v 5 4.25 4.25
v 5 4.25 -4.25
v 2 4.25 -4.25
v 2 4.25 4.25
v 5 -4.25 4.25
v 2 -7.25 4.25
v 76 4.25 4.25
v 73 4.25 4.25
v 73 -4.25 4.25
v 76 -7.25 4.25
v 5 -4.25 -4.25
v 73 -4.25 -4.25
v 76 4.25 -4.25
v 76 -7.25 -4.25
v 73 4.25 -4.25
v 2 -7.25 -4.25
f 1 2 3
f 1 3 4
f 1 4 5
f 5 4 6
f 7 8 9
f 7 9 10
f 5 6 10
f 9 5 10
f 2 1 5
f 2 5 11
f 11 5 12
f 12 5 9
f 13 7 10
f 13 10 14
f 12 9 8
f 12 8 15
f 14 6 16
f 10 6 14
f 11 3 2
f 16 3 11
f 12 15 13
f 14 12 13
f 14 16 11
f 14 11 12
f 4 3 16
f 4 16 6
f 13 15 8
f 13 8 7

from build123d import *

# Parameters (mm, degrees)
SKETCH1_W            = 8.5
SKETCH1_H            = 8.5
BOSS_EXTRUDE1_DEPTH  = 5
SKETCH2_W            = 8.5
SKETCH2_H            = 8.5
BOSS_EXTRUDE2_DEPTH  = 2
SKETCH3_R            = 1.5
CUT_EXTRUDE1_DEPTH   = 2
SKETCH4_W            = 82
SKETCH4_H            = 8.5
BOSS_EXTRUDE3_DEPTH  = 3
SKETCH5_W            = 7
SKETCH5_H            = 8.5
BOSS_EXTRUDE4_DEPTH  = 8.5
CUT_EXTRUDE2_DEPTH   = 5
SKETCH7_R            = 1.5
CUT_EXTRUDE3_DEPTH   = 5
CUT_EXTRUDE4_DEPTH   = 10
SKETCH9_W            = 8.5
SKETCH9_H            = 8.5
SKETCH9_R            = 1.5
BOSS_EXTRUDE5_DEPTH  = 2
CUT_EXTRUDE5_DEPTH   = 2
SKETCH11_W           = 8.5
SKETCH11_H           = 8.5
SKETCH11_R           = 1.5
BOSS_EXTRUDE6_DEPTH  = 2
BOSS_EXTRUDE7_DEPTH  = 5
BOSS_EXTRUDE8_DEPTH  = 5
SKETCH14_W           = 8.5
SKETCH14_H           = 11.5
CUT_EXTRUDE6_DEPTH   = 4
SKETCH15_W           = 8.5
SKETCH15_H           = 11.5
CUT_EXTRUDE7_DEPTH   = 4
SKETCH16_R           = 1.5
CUT_EXTRUDE8_DEPTH   = 4
SKETCH17_R           = 1.5
CUT_EXTRUDE9_DEPTH   = 4
SKETCH19_W           = 8.5
SKETCH19_H           = 8.5
BOSS_EXTRUDE9_DEPTH  = 3
SKETCH20_W           = 8.5
SKETCH20_H           = 8.5
BOSS_EXTRUDE10_DEPTH = 3


with BuildPart() as part:
    # Sketch1 → Boss-Extrude1 (new body)
    with BuildSketch(Plane(origin=(0, 0, 0), x_dir=(0, 0, -1), z_dir=(1, 0, 0))):
        Rectangle(SKETCH1_W, SKETCH1_H)
        Polygon((1.58771324, 2.75), (-1.58771324, 2.75), (-3.175426481, 0), (-1.58771324, -2.75), (1.58771324, -2.75), (3.175426481, 0), align=None, mode=Mode.SUBTRACT)
    extrude(amount=BOSS_EXTRUDE1_DEPTH)

    # Sketch2 → Boss-Extrude2 (add)
    with BuildSketch(Plane.ZY):
        Rectangle(SKETCH2_W, SKETCH2_H)
    extrude(amount=BOSS_EXTRUDE2_DEPTH)

    # Sketch3 → Cut-Extrude1 (cut)
    with BuildSketch(Plane(origin=(0, 0, 0), x_dir=(0, 0, -1), z_dir=(1, 0, 0))):
        Circle(SKETCH3_R)
    extrude(amount=-CUT_EXTRUDE1_DEPTH, mode=Mode.SUBTRACT)

    # Sketch4 → Boss-Extrude3 (add)
    with BuildSketch(Plane.XZ.offset(4.25)):
        with Locations((39, 0)):
            Rectangle(SKETCH4_W, SKETCH4_H)
    extrude(amount=BOSS_EXTRUDE3_DEPTH)

    # Sketch5 → Boss-Extrude4 (add)
    with BuildSketch(Plane(origin=(0, -4.25, 0), x_dir=(1, 0, 0), z_dir=(0, 1, 0))):
        with Locations((76.5, 0)):
            Rectangle(SKETCH5_W, SKETCH5_H)
    extrude(amount=BOSS_EXTRUDE4_DEPTH)

    # Sketch6 → Cut-Extrude2 (cut)
    with BuildSketch(Plane.ZY.offset(-73)):
        Polygon((3.175426481, 0), (1.58771324, 2.75), (-1.58771324, 2.75), (-3.175426481, 0), (-1.58771324, -2.75), (1.58771324, -2.75), align=None)
    extrude(amount=-CUT_EXTRUDE2_DEPTH, mode=Mode.SUBTRACT)

    # Sketch7 → Cut-Extrude3 (cut)
    with BuildSketch(Plane.ZY.offset(-78)):
        Circle(SKETCH7_R)
    extrude(amount=-CUT_EXTRUDE3_DEPTH, mode=Mode.SUBTRACT)

    # Sketch8 → Cut-Extrude4 (cut)
    with BuildSketch(Plane.ZY.offset(2)):
        Polygon((-1.58771324, 2.75), (1.58771324, 2.75), (3.175426481, 0), (1.58771324, -2.75), (-1.58771324, -2.75), (-3.175426481, 0), align=None)
    extrude(amount=-CUT_EXTRUDE4_DEPTH, mode=Mode.SUBTRACT)

    # Sketch9 → Boss-Extrude5 (add)
    with BuildSketch(Plane(origin=(5, 0, 0), x_dir=(0, 0, -1), z_dir=(1, 0, 0))):
        Rectangle(SKETCH9_W, SKETCH9_H)
        Circle(SKETCH9_R, mode=Mode.SUBTRACT)
    extrude(amount=-BOSS_EXTRUDE5_DEPTH)

    # Sketch10 → Cut-Extrude5 (cut)
    with BuildSketch(Plane(origin=(80, 0, 0), x_dir=(0, 0, -1), z_dir=(1, 0, 0))):
        Polygon((-3.175426481, 0), (-1.58771324, 2.75), (1.58771324, 2.75), (3.175426481, 0), (1.58771324, -2.75), (-1.58771324, -2.75), align=None)
    extrude(amount=-CUT_EXTRUDE5_DEPTH, mode=Mode.SUBTRACT)

    # Sketch11 → Boss-Extrude6 (add)
    with BuildSketch(Plane.ZY.offset(-73)):
        Rectangle(SKETCH11_W, SKETCH11_H)
        Circle(SKETCH11_R, mode=Mode.SUBTRACT)
    extrude(amount=-BOSS_EXTRUDE6_DEPTH)

    # Sketch12 → Boss-Extrude7 (add)
    with BuildSketch(Plane.ZY.offset(-3)):
        Polygon((-3.175426481, 0), (-1.58771324, 2.75), (1.58771324, 2.75), (3.175426481, 0), (1.58771324, -2.75), (-1.58771324, -2.75), align=None)
    extrude(amount=BOSS_EXTRUDE7_DEPTH)

    # Sketch13 → Boss-Extrude8 (add)
    with BuildSketch(Plane(origin=(75, 0, 0), x_dir=(0, 0, -1), z_dir=(1, 0, 0))):
        Polygon((-1.58771324, 2.75), (-3.175426481, 0), (-1.58771324, -2.75), (1.58771324, -2.75), (3.175426481, 0), (1.58771324, 2.75), align=None)
    extrude(amount=BOSS_EXTRUDE8_DEPTH)

    # Sketch14 → Cut-Extrude6 (cut)
    with BuildSketch(Plane.ZY.offset(2)):
        with Locations((0, -1.5)):
            Rectangle(SKETCH14_W, SKETCH14_H)
    extrude(amount=-CUT_EXTRUDE6_DEPTH, mode=Mode.SUBTRACT)

    # Sketch15 → Cut-Extrude7 (cut)
    with BuildSketch(Plane(origin=(80, 0, 0), x_dir=(0, 0, -1), z_dir=(1, 0, 0))):
        with Locations((0, -1.5)):
            Rectangle(SKETCH15_W, SKETCH15_H)
    extrude(amount=-CUT_EXTRUDE7_DEPTH, mode=Mode.SUBTRACT)

    # Sketch16 → Cut-Extrude8 (cut)
    with BuildSketch(Plane(origin=(5, 0, 0), x_dir=(0, 0, -1), z_dir=(1, 0, 0))):
        Circle(SKETCH16_R)
    extrude(amount=-CUT_EXTRUDE8_DEPTH, mode=Mode.SUBTRACT)

    # Sketch17 → Cut-Extrude9 (cut)
    with BuildSketch(Plane.ZY.offset(-75)):
        Circle(SKETCH17_R)
    extrude(amount=-CUT_EXTRUDE9_DEPTH, mode=Mode.SUBTRACT)

    # Sketch19 → Boss-Extrude9 (add)
    with BuildSketch(Plane(origin=(5, 0, 0), x_dir=(0, 0, -1), z_dir=(1, 0, 0))):
        Rectangle(SKETCH19_W, SKETCH19_H)
    extrude(amount=-BOSS_EXTRUDE9_DEPTH)

    # Sketch20 → Boss-Extrude10 (add)
    with BuildSketch(Plane.ZY.offset(-73)):
        Rectangle(SKETCH20_W, SKETCH20_H)
    extrude(amount=-BOSS_EXTRUDE10_DEPTH)


solid = part.part
